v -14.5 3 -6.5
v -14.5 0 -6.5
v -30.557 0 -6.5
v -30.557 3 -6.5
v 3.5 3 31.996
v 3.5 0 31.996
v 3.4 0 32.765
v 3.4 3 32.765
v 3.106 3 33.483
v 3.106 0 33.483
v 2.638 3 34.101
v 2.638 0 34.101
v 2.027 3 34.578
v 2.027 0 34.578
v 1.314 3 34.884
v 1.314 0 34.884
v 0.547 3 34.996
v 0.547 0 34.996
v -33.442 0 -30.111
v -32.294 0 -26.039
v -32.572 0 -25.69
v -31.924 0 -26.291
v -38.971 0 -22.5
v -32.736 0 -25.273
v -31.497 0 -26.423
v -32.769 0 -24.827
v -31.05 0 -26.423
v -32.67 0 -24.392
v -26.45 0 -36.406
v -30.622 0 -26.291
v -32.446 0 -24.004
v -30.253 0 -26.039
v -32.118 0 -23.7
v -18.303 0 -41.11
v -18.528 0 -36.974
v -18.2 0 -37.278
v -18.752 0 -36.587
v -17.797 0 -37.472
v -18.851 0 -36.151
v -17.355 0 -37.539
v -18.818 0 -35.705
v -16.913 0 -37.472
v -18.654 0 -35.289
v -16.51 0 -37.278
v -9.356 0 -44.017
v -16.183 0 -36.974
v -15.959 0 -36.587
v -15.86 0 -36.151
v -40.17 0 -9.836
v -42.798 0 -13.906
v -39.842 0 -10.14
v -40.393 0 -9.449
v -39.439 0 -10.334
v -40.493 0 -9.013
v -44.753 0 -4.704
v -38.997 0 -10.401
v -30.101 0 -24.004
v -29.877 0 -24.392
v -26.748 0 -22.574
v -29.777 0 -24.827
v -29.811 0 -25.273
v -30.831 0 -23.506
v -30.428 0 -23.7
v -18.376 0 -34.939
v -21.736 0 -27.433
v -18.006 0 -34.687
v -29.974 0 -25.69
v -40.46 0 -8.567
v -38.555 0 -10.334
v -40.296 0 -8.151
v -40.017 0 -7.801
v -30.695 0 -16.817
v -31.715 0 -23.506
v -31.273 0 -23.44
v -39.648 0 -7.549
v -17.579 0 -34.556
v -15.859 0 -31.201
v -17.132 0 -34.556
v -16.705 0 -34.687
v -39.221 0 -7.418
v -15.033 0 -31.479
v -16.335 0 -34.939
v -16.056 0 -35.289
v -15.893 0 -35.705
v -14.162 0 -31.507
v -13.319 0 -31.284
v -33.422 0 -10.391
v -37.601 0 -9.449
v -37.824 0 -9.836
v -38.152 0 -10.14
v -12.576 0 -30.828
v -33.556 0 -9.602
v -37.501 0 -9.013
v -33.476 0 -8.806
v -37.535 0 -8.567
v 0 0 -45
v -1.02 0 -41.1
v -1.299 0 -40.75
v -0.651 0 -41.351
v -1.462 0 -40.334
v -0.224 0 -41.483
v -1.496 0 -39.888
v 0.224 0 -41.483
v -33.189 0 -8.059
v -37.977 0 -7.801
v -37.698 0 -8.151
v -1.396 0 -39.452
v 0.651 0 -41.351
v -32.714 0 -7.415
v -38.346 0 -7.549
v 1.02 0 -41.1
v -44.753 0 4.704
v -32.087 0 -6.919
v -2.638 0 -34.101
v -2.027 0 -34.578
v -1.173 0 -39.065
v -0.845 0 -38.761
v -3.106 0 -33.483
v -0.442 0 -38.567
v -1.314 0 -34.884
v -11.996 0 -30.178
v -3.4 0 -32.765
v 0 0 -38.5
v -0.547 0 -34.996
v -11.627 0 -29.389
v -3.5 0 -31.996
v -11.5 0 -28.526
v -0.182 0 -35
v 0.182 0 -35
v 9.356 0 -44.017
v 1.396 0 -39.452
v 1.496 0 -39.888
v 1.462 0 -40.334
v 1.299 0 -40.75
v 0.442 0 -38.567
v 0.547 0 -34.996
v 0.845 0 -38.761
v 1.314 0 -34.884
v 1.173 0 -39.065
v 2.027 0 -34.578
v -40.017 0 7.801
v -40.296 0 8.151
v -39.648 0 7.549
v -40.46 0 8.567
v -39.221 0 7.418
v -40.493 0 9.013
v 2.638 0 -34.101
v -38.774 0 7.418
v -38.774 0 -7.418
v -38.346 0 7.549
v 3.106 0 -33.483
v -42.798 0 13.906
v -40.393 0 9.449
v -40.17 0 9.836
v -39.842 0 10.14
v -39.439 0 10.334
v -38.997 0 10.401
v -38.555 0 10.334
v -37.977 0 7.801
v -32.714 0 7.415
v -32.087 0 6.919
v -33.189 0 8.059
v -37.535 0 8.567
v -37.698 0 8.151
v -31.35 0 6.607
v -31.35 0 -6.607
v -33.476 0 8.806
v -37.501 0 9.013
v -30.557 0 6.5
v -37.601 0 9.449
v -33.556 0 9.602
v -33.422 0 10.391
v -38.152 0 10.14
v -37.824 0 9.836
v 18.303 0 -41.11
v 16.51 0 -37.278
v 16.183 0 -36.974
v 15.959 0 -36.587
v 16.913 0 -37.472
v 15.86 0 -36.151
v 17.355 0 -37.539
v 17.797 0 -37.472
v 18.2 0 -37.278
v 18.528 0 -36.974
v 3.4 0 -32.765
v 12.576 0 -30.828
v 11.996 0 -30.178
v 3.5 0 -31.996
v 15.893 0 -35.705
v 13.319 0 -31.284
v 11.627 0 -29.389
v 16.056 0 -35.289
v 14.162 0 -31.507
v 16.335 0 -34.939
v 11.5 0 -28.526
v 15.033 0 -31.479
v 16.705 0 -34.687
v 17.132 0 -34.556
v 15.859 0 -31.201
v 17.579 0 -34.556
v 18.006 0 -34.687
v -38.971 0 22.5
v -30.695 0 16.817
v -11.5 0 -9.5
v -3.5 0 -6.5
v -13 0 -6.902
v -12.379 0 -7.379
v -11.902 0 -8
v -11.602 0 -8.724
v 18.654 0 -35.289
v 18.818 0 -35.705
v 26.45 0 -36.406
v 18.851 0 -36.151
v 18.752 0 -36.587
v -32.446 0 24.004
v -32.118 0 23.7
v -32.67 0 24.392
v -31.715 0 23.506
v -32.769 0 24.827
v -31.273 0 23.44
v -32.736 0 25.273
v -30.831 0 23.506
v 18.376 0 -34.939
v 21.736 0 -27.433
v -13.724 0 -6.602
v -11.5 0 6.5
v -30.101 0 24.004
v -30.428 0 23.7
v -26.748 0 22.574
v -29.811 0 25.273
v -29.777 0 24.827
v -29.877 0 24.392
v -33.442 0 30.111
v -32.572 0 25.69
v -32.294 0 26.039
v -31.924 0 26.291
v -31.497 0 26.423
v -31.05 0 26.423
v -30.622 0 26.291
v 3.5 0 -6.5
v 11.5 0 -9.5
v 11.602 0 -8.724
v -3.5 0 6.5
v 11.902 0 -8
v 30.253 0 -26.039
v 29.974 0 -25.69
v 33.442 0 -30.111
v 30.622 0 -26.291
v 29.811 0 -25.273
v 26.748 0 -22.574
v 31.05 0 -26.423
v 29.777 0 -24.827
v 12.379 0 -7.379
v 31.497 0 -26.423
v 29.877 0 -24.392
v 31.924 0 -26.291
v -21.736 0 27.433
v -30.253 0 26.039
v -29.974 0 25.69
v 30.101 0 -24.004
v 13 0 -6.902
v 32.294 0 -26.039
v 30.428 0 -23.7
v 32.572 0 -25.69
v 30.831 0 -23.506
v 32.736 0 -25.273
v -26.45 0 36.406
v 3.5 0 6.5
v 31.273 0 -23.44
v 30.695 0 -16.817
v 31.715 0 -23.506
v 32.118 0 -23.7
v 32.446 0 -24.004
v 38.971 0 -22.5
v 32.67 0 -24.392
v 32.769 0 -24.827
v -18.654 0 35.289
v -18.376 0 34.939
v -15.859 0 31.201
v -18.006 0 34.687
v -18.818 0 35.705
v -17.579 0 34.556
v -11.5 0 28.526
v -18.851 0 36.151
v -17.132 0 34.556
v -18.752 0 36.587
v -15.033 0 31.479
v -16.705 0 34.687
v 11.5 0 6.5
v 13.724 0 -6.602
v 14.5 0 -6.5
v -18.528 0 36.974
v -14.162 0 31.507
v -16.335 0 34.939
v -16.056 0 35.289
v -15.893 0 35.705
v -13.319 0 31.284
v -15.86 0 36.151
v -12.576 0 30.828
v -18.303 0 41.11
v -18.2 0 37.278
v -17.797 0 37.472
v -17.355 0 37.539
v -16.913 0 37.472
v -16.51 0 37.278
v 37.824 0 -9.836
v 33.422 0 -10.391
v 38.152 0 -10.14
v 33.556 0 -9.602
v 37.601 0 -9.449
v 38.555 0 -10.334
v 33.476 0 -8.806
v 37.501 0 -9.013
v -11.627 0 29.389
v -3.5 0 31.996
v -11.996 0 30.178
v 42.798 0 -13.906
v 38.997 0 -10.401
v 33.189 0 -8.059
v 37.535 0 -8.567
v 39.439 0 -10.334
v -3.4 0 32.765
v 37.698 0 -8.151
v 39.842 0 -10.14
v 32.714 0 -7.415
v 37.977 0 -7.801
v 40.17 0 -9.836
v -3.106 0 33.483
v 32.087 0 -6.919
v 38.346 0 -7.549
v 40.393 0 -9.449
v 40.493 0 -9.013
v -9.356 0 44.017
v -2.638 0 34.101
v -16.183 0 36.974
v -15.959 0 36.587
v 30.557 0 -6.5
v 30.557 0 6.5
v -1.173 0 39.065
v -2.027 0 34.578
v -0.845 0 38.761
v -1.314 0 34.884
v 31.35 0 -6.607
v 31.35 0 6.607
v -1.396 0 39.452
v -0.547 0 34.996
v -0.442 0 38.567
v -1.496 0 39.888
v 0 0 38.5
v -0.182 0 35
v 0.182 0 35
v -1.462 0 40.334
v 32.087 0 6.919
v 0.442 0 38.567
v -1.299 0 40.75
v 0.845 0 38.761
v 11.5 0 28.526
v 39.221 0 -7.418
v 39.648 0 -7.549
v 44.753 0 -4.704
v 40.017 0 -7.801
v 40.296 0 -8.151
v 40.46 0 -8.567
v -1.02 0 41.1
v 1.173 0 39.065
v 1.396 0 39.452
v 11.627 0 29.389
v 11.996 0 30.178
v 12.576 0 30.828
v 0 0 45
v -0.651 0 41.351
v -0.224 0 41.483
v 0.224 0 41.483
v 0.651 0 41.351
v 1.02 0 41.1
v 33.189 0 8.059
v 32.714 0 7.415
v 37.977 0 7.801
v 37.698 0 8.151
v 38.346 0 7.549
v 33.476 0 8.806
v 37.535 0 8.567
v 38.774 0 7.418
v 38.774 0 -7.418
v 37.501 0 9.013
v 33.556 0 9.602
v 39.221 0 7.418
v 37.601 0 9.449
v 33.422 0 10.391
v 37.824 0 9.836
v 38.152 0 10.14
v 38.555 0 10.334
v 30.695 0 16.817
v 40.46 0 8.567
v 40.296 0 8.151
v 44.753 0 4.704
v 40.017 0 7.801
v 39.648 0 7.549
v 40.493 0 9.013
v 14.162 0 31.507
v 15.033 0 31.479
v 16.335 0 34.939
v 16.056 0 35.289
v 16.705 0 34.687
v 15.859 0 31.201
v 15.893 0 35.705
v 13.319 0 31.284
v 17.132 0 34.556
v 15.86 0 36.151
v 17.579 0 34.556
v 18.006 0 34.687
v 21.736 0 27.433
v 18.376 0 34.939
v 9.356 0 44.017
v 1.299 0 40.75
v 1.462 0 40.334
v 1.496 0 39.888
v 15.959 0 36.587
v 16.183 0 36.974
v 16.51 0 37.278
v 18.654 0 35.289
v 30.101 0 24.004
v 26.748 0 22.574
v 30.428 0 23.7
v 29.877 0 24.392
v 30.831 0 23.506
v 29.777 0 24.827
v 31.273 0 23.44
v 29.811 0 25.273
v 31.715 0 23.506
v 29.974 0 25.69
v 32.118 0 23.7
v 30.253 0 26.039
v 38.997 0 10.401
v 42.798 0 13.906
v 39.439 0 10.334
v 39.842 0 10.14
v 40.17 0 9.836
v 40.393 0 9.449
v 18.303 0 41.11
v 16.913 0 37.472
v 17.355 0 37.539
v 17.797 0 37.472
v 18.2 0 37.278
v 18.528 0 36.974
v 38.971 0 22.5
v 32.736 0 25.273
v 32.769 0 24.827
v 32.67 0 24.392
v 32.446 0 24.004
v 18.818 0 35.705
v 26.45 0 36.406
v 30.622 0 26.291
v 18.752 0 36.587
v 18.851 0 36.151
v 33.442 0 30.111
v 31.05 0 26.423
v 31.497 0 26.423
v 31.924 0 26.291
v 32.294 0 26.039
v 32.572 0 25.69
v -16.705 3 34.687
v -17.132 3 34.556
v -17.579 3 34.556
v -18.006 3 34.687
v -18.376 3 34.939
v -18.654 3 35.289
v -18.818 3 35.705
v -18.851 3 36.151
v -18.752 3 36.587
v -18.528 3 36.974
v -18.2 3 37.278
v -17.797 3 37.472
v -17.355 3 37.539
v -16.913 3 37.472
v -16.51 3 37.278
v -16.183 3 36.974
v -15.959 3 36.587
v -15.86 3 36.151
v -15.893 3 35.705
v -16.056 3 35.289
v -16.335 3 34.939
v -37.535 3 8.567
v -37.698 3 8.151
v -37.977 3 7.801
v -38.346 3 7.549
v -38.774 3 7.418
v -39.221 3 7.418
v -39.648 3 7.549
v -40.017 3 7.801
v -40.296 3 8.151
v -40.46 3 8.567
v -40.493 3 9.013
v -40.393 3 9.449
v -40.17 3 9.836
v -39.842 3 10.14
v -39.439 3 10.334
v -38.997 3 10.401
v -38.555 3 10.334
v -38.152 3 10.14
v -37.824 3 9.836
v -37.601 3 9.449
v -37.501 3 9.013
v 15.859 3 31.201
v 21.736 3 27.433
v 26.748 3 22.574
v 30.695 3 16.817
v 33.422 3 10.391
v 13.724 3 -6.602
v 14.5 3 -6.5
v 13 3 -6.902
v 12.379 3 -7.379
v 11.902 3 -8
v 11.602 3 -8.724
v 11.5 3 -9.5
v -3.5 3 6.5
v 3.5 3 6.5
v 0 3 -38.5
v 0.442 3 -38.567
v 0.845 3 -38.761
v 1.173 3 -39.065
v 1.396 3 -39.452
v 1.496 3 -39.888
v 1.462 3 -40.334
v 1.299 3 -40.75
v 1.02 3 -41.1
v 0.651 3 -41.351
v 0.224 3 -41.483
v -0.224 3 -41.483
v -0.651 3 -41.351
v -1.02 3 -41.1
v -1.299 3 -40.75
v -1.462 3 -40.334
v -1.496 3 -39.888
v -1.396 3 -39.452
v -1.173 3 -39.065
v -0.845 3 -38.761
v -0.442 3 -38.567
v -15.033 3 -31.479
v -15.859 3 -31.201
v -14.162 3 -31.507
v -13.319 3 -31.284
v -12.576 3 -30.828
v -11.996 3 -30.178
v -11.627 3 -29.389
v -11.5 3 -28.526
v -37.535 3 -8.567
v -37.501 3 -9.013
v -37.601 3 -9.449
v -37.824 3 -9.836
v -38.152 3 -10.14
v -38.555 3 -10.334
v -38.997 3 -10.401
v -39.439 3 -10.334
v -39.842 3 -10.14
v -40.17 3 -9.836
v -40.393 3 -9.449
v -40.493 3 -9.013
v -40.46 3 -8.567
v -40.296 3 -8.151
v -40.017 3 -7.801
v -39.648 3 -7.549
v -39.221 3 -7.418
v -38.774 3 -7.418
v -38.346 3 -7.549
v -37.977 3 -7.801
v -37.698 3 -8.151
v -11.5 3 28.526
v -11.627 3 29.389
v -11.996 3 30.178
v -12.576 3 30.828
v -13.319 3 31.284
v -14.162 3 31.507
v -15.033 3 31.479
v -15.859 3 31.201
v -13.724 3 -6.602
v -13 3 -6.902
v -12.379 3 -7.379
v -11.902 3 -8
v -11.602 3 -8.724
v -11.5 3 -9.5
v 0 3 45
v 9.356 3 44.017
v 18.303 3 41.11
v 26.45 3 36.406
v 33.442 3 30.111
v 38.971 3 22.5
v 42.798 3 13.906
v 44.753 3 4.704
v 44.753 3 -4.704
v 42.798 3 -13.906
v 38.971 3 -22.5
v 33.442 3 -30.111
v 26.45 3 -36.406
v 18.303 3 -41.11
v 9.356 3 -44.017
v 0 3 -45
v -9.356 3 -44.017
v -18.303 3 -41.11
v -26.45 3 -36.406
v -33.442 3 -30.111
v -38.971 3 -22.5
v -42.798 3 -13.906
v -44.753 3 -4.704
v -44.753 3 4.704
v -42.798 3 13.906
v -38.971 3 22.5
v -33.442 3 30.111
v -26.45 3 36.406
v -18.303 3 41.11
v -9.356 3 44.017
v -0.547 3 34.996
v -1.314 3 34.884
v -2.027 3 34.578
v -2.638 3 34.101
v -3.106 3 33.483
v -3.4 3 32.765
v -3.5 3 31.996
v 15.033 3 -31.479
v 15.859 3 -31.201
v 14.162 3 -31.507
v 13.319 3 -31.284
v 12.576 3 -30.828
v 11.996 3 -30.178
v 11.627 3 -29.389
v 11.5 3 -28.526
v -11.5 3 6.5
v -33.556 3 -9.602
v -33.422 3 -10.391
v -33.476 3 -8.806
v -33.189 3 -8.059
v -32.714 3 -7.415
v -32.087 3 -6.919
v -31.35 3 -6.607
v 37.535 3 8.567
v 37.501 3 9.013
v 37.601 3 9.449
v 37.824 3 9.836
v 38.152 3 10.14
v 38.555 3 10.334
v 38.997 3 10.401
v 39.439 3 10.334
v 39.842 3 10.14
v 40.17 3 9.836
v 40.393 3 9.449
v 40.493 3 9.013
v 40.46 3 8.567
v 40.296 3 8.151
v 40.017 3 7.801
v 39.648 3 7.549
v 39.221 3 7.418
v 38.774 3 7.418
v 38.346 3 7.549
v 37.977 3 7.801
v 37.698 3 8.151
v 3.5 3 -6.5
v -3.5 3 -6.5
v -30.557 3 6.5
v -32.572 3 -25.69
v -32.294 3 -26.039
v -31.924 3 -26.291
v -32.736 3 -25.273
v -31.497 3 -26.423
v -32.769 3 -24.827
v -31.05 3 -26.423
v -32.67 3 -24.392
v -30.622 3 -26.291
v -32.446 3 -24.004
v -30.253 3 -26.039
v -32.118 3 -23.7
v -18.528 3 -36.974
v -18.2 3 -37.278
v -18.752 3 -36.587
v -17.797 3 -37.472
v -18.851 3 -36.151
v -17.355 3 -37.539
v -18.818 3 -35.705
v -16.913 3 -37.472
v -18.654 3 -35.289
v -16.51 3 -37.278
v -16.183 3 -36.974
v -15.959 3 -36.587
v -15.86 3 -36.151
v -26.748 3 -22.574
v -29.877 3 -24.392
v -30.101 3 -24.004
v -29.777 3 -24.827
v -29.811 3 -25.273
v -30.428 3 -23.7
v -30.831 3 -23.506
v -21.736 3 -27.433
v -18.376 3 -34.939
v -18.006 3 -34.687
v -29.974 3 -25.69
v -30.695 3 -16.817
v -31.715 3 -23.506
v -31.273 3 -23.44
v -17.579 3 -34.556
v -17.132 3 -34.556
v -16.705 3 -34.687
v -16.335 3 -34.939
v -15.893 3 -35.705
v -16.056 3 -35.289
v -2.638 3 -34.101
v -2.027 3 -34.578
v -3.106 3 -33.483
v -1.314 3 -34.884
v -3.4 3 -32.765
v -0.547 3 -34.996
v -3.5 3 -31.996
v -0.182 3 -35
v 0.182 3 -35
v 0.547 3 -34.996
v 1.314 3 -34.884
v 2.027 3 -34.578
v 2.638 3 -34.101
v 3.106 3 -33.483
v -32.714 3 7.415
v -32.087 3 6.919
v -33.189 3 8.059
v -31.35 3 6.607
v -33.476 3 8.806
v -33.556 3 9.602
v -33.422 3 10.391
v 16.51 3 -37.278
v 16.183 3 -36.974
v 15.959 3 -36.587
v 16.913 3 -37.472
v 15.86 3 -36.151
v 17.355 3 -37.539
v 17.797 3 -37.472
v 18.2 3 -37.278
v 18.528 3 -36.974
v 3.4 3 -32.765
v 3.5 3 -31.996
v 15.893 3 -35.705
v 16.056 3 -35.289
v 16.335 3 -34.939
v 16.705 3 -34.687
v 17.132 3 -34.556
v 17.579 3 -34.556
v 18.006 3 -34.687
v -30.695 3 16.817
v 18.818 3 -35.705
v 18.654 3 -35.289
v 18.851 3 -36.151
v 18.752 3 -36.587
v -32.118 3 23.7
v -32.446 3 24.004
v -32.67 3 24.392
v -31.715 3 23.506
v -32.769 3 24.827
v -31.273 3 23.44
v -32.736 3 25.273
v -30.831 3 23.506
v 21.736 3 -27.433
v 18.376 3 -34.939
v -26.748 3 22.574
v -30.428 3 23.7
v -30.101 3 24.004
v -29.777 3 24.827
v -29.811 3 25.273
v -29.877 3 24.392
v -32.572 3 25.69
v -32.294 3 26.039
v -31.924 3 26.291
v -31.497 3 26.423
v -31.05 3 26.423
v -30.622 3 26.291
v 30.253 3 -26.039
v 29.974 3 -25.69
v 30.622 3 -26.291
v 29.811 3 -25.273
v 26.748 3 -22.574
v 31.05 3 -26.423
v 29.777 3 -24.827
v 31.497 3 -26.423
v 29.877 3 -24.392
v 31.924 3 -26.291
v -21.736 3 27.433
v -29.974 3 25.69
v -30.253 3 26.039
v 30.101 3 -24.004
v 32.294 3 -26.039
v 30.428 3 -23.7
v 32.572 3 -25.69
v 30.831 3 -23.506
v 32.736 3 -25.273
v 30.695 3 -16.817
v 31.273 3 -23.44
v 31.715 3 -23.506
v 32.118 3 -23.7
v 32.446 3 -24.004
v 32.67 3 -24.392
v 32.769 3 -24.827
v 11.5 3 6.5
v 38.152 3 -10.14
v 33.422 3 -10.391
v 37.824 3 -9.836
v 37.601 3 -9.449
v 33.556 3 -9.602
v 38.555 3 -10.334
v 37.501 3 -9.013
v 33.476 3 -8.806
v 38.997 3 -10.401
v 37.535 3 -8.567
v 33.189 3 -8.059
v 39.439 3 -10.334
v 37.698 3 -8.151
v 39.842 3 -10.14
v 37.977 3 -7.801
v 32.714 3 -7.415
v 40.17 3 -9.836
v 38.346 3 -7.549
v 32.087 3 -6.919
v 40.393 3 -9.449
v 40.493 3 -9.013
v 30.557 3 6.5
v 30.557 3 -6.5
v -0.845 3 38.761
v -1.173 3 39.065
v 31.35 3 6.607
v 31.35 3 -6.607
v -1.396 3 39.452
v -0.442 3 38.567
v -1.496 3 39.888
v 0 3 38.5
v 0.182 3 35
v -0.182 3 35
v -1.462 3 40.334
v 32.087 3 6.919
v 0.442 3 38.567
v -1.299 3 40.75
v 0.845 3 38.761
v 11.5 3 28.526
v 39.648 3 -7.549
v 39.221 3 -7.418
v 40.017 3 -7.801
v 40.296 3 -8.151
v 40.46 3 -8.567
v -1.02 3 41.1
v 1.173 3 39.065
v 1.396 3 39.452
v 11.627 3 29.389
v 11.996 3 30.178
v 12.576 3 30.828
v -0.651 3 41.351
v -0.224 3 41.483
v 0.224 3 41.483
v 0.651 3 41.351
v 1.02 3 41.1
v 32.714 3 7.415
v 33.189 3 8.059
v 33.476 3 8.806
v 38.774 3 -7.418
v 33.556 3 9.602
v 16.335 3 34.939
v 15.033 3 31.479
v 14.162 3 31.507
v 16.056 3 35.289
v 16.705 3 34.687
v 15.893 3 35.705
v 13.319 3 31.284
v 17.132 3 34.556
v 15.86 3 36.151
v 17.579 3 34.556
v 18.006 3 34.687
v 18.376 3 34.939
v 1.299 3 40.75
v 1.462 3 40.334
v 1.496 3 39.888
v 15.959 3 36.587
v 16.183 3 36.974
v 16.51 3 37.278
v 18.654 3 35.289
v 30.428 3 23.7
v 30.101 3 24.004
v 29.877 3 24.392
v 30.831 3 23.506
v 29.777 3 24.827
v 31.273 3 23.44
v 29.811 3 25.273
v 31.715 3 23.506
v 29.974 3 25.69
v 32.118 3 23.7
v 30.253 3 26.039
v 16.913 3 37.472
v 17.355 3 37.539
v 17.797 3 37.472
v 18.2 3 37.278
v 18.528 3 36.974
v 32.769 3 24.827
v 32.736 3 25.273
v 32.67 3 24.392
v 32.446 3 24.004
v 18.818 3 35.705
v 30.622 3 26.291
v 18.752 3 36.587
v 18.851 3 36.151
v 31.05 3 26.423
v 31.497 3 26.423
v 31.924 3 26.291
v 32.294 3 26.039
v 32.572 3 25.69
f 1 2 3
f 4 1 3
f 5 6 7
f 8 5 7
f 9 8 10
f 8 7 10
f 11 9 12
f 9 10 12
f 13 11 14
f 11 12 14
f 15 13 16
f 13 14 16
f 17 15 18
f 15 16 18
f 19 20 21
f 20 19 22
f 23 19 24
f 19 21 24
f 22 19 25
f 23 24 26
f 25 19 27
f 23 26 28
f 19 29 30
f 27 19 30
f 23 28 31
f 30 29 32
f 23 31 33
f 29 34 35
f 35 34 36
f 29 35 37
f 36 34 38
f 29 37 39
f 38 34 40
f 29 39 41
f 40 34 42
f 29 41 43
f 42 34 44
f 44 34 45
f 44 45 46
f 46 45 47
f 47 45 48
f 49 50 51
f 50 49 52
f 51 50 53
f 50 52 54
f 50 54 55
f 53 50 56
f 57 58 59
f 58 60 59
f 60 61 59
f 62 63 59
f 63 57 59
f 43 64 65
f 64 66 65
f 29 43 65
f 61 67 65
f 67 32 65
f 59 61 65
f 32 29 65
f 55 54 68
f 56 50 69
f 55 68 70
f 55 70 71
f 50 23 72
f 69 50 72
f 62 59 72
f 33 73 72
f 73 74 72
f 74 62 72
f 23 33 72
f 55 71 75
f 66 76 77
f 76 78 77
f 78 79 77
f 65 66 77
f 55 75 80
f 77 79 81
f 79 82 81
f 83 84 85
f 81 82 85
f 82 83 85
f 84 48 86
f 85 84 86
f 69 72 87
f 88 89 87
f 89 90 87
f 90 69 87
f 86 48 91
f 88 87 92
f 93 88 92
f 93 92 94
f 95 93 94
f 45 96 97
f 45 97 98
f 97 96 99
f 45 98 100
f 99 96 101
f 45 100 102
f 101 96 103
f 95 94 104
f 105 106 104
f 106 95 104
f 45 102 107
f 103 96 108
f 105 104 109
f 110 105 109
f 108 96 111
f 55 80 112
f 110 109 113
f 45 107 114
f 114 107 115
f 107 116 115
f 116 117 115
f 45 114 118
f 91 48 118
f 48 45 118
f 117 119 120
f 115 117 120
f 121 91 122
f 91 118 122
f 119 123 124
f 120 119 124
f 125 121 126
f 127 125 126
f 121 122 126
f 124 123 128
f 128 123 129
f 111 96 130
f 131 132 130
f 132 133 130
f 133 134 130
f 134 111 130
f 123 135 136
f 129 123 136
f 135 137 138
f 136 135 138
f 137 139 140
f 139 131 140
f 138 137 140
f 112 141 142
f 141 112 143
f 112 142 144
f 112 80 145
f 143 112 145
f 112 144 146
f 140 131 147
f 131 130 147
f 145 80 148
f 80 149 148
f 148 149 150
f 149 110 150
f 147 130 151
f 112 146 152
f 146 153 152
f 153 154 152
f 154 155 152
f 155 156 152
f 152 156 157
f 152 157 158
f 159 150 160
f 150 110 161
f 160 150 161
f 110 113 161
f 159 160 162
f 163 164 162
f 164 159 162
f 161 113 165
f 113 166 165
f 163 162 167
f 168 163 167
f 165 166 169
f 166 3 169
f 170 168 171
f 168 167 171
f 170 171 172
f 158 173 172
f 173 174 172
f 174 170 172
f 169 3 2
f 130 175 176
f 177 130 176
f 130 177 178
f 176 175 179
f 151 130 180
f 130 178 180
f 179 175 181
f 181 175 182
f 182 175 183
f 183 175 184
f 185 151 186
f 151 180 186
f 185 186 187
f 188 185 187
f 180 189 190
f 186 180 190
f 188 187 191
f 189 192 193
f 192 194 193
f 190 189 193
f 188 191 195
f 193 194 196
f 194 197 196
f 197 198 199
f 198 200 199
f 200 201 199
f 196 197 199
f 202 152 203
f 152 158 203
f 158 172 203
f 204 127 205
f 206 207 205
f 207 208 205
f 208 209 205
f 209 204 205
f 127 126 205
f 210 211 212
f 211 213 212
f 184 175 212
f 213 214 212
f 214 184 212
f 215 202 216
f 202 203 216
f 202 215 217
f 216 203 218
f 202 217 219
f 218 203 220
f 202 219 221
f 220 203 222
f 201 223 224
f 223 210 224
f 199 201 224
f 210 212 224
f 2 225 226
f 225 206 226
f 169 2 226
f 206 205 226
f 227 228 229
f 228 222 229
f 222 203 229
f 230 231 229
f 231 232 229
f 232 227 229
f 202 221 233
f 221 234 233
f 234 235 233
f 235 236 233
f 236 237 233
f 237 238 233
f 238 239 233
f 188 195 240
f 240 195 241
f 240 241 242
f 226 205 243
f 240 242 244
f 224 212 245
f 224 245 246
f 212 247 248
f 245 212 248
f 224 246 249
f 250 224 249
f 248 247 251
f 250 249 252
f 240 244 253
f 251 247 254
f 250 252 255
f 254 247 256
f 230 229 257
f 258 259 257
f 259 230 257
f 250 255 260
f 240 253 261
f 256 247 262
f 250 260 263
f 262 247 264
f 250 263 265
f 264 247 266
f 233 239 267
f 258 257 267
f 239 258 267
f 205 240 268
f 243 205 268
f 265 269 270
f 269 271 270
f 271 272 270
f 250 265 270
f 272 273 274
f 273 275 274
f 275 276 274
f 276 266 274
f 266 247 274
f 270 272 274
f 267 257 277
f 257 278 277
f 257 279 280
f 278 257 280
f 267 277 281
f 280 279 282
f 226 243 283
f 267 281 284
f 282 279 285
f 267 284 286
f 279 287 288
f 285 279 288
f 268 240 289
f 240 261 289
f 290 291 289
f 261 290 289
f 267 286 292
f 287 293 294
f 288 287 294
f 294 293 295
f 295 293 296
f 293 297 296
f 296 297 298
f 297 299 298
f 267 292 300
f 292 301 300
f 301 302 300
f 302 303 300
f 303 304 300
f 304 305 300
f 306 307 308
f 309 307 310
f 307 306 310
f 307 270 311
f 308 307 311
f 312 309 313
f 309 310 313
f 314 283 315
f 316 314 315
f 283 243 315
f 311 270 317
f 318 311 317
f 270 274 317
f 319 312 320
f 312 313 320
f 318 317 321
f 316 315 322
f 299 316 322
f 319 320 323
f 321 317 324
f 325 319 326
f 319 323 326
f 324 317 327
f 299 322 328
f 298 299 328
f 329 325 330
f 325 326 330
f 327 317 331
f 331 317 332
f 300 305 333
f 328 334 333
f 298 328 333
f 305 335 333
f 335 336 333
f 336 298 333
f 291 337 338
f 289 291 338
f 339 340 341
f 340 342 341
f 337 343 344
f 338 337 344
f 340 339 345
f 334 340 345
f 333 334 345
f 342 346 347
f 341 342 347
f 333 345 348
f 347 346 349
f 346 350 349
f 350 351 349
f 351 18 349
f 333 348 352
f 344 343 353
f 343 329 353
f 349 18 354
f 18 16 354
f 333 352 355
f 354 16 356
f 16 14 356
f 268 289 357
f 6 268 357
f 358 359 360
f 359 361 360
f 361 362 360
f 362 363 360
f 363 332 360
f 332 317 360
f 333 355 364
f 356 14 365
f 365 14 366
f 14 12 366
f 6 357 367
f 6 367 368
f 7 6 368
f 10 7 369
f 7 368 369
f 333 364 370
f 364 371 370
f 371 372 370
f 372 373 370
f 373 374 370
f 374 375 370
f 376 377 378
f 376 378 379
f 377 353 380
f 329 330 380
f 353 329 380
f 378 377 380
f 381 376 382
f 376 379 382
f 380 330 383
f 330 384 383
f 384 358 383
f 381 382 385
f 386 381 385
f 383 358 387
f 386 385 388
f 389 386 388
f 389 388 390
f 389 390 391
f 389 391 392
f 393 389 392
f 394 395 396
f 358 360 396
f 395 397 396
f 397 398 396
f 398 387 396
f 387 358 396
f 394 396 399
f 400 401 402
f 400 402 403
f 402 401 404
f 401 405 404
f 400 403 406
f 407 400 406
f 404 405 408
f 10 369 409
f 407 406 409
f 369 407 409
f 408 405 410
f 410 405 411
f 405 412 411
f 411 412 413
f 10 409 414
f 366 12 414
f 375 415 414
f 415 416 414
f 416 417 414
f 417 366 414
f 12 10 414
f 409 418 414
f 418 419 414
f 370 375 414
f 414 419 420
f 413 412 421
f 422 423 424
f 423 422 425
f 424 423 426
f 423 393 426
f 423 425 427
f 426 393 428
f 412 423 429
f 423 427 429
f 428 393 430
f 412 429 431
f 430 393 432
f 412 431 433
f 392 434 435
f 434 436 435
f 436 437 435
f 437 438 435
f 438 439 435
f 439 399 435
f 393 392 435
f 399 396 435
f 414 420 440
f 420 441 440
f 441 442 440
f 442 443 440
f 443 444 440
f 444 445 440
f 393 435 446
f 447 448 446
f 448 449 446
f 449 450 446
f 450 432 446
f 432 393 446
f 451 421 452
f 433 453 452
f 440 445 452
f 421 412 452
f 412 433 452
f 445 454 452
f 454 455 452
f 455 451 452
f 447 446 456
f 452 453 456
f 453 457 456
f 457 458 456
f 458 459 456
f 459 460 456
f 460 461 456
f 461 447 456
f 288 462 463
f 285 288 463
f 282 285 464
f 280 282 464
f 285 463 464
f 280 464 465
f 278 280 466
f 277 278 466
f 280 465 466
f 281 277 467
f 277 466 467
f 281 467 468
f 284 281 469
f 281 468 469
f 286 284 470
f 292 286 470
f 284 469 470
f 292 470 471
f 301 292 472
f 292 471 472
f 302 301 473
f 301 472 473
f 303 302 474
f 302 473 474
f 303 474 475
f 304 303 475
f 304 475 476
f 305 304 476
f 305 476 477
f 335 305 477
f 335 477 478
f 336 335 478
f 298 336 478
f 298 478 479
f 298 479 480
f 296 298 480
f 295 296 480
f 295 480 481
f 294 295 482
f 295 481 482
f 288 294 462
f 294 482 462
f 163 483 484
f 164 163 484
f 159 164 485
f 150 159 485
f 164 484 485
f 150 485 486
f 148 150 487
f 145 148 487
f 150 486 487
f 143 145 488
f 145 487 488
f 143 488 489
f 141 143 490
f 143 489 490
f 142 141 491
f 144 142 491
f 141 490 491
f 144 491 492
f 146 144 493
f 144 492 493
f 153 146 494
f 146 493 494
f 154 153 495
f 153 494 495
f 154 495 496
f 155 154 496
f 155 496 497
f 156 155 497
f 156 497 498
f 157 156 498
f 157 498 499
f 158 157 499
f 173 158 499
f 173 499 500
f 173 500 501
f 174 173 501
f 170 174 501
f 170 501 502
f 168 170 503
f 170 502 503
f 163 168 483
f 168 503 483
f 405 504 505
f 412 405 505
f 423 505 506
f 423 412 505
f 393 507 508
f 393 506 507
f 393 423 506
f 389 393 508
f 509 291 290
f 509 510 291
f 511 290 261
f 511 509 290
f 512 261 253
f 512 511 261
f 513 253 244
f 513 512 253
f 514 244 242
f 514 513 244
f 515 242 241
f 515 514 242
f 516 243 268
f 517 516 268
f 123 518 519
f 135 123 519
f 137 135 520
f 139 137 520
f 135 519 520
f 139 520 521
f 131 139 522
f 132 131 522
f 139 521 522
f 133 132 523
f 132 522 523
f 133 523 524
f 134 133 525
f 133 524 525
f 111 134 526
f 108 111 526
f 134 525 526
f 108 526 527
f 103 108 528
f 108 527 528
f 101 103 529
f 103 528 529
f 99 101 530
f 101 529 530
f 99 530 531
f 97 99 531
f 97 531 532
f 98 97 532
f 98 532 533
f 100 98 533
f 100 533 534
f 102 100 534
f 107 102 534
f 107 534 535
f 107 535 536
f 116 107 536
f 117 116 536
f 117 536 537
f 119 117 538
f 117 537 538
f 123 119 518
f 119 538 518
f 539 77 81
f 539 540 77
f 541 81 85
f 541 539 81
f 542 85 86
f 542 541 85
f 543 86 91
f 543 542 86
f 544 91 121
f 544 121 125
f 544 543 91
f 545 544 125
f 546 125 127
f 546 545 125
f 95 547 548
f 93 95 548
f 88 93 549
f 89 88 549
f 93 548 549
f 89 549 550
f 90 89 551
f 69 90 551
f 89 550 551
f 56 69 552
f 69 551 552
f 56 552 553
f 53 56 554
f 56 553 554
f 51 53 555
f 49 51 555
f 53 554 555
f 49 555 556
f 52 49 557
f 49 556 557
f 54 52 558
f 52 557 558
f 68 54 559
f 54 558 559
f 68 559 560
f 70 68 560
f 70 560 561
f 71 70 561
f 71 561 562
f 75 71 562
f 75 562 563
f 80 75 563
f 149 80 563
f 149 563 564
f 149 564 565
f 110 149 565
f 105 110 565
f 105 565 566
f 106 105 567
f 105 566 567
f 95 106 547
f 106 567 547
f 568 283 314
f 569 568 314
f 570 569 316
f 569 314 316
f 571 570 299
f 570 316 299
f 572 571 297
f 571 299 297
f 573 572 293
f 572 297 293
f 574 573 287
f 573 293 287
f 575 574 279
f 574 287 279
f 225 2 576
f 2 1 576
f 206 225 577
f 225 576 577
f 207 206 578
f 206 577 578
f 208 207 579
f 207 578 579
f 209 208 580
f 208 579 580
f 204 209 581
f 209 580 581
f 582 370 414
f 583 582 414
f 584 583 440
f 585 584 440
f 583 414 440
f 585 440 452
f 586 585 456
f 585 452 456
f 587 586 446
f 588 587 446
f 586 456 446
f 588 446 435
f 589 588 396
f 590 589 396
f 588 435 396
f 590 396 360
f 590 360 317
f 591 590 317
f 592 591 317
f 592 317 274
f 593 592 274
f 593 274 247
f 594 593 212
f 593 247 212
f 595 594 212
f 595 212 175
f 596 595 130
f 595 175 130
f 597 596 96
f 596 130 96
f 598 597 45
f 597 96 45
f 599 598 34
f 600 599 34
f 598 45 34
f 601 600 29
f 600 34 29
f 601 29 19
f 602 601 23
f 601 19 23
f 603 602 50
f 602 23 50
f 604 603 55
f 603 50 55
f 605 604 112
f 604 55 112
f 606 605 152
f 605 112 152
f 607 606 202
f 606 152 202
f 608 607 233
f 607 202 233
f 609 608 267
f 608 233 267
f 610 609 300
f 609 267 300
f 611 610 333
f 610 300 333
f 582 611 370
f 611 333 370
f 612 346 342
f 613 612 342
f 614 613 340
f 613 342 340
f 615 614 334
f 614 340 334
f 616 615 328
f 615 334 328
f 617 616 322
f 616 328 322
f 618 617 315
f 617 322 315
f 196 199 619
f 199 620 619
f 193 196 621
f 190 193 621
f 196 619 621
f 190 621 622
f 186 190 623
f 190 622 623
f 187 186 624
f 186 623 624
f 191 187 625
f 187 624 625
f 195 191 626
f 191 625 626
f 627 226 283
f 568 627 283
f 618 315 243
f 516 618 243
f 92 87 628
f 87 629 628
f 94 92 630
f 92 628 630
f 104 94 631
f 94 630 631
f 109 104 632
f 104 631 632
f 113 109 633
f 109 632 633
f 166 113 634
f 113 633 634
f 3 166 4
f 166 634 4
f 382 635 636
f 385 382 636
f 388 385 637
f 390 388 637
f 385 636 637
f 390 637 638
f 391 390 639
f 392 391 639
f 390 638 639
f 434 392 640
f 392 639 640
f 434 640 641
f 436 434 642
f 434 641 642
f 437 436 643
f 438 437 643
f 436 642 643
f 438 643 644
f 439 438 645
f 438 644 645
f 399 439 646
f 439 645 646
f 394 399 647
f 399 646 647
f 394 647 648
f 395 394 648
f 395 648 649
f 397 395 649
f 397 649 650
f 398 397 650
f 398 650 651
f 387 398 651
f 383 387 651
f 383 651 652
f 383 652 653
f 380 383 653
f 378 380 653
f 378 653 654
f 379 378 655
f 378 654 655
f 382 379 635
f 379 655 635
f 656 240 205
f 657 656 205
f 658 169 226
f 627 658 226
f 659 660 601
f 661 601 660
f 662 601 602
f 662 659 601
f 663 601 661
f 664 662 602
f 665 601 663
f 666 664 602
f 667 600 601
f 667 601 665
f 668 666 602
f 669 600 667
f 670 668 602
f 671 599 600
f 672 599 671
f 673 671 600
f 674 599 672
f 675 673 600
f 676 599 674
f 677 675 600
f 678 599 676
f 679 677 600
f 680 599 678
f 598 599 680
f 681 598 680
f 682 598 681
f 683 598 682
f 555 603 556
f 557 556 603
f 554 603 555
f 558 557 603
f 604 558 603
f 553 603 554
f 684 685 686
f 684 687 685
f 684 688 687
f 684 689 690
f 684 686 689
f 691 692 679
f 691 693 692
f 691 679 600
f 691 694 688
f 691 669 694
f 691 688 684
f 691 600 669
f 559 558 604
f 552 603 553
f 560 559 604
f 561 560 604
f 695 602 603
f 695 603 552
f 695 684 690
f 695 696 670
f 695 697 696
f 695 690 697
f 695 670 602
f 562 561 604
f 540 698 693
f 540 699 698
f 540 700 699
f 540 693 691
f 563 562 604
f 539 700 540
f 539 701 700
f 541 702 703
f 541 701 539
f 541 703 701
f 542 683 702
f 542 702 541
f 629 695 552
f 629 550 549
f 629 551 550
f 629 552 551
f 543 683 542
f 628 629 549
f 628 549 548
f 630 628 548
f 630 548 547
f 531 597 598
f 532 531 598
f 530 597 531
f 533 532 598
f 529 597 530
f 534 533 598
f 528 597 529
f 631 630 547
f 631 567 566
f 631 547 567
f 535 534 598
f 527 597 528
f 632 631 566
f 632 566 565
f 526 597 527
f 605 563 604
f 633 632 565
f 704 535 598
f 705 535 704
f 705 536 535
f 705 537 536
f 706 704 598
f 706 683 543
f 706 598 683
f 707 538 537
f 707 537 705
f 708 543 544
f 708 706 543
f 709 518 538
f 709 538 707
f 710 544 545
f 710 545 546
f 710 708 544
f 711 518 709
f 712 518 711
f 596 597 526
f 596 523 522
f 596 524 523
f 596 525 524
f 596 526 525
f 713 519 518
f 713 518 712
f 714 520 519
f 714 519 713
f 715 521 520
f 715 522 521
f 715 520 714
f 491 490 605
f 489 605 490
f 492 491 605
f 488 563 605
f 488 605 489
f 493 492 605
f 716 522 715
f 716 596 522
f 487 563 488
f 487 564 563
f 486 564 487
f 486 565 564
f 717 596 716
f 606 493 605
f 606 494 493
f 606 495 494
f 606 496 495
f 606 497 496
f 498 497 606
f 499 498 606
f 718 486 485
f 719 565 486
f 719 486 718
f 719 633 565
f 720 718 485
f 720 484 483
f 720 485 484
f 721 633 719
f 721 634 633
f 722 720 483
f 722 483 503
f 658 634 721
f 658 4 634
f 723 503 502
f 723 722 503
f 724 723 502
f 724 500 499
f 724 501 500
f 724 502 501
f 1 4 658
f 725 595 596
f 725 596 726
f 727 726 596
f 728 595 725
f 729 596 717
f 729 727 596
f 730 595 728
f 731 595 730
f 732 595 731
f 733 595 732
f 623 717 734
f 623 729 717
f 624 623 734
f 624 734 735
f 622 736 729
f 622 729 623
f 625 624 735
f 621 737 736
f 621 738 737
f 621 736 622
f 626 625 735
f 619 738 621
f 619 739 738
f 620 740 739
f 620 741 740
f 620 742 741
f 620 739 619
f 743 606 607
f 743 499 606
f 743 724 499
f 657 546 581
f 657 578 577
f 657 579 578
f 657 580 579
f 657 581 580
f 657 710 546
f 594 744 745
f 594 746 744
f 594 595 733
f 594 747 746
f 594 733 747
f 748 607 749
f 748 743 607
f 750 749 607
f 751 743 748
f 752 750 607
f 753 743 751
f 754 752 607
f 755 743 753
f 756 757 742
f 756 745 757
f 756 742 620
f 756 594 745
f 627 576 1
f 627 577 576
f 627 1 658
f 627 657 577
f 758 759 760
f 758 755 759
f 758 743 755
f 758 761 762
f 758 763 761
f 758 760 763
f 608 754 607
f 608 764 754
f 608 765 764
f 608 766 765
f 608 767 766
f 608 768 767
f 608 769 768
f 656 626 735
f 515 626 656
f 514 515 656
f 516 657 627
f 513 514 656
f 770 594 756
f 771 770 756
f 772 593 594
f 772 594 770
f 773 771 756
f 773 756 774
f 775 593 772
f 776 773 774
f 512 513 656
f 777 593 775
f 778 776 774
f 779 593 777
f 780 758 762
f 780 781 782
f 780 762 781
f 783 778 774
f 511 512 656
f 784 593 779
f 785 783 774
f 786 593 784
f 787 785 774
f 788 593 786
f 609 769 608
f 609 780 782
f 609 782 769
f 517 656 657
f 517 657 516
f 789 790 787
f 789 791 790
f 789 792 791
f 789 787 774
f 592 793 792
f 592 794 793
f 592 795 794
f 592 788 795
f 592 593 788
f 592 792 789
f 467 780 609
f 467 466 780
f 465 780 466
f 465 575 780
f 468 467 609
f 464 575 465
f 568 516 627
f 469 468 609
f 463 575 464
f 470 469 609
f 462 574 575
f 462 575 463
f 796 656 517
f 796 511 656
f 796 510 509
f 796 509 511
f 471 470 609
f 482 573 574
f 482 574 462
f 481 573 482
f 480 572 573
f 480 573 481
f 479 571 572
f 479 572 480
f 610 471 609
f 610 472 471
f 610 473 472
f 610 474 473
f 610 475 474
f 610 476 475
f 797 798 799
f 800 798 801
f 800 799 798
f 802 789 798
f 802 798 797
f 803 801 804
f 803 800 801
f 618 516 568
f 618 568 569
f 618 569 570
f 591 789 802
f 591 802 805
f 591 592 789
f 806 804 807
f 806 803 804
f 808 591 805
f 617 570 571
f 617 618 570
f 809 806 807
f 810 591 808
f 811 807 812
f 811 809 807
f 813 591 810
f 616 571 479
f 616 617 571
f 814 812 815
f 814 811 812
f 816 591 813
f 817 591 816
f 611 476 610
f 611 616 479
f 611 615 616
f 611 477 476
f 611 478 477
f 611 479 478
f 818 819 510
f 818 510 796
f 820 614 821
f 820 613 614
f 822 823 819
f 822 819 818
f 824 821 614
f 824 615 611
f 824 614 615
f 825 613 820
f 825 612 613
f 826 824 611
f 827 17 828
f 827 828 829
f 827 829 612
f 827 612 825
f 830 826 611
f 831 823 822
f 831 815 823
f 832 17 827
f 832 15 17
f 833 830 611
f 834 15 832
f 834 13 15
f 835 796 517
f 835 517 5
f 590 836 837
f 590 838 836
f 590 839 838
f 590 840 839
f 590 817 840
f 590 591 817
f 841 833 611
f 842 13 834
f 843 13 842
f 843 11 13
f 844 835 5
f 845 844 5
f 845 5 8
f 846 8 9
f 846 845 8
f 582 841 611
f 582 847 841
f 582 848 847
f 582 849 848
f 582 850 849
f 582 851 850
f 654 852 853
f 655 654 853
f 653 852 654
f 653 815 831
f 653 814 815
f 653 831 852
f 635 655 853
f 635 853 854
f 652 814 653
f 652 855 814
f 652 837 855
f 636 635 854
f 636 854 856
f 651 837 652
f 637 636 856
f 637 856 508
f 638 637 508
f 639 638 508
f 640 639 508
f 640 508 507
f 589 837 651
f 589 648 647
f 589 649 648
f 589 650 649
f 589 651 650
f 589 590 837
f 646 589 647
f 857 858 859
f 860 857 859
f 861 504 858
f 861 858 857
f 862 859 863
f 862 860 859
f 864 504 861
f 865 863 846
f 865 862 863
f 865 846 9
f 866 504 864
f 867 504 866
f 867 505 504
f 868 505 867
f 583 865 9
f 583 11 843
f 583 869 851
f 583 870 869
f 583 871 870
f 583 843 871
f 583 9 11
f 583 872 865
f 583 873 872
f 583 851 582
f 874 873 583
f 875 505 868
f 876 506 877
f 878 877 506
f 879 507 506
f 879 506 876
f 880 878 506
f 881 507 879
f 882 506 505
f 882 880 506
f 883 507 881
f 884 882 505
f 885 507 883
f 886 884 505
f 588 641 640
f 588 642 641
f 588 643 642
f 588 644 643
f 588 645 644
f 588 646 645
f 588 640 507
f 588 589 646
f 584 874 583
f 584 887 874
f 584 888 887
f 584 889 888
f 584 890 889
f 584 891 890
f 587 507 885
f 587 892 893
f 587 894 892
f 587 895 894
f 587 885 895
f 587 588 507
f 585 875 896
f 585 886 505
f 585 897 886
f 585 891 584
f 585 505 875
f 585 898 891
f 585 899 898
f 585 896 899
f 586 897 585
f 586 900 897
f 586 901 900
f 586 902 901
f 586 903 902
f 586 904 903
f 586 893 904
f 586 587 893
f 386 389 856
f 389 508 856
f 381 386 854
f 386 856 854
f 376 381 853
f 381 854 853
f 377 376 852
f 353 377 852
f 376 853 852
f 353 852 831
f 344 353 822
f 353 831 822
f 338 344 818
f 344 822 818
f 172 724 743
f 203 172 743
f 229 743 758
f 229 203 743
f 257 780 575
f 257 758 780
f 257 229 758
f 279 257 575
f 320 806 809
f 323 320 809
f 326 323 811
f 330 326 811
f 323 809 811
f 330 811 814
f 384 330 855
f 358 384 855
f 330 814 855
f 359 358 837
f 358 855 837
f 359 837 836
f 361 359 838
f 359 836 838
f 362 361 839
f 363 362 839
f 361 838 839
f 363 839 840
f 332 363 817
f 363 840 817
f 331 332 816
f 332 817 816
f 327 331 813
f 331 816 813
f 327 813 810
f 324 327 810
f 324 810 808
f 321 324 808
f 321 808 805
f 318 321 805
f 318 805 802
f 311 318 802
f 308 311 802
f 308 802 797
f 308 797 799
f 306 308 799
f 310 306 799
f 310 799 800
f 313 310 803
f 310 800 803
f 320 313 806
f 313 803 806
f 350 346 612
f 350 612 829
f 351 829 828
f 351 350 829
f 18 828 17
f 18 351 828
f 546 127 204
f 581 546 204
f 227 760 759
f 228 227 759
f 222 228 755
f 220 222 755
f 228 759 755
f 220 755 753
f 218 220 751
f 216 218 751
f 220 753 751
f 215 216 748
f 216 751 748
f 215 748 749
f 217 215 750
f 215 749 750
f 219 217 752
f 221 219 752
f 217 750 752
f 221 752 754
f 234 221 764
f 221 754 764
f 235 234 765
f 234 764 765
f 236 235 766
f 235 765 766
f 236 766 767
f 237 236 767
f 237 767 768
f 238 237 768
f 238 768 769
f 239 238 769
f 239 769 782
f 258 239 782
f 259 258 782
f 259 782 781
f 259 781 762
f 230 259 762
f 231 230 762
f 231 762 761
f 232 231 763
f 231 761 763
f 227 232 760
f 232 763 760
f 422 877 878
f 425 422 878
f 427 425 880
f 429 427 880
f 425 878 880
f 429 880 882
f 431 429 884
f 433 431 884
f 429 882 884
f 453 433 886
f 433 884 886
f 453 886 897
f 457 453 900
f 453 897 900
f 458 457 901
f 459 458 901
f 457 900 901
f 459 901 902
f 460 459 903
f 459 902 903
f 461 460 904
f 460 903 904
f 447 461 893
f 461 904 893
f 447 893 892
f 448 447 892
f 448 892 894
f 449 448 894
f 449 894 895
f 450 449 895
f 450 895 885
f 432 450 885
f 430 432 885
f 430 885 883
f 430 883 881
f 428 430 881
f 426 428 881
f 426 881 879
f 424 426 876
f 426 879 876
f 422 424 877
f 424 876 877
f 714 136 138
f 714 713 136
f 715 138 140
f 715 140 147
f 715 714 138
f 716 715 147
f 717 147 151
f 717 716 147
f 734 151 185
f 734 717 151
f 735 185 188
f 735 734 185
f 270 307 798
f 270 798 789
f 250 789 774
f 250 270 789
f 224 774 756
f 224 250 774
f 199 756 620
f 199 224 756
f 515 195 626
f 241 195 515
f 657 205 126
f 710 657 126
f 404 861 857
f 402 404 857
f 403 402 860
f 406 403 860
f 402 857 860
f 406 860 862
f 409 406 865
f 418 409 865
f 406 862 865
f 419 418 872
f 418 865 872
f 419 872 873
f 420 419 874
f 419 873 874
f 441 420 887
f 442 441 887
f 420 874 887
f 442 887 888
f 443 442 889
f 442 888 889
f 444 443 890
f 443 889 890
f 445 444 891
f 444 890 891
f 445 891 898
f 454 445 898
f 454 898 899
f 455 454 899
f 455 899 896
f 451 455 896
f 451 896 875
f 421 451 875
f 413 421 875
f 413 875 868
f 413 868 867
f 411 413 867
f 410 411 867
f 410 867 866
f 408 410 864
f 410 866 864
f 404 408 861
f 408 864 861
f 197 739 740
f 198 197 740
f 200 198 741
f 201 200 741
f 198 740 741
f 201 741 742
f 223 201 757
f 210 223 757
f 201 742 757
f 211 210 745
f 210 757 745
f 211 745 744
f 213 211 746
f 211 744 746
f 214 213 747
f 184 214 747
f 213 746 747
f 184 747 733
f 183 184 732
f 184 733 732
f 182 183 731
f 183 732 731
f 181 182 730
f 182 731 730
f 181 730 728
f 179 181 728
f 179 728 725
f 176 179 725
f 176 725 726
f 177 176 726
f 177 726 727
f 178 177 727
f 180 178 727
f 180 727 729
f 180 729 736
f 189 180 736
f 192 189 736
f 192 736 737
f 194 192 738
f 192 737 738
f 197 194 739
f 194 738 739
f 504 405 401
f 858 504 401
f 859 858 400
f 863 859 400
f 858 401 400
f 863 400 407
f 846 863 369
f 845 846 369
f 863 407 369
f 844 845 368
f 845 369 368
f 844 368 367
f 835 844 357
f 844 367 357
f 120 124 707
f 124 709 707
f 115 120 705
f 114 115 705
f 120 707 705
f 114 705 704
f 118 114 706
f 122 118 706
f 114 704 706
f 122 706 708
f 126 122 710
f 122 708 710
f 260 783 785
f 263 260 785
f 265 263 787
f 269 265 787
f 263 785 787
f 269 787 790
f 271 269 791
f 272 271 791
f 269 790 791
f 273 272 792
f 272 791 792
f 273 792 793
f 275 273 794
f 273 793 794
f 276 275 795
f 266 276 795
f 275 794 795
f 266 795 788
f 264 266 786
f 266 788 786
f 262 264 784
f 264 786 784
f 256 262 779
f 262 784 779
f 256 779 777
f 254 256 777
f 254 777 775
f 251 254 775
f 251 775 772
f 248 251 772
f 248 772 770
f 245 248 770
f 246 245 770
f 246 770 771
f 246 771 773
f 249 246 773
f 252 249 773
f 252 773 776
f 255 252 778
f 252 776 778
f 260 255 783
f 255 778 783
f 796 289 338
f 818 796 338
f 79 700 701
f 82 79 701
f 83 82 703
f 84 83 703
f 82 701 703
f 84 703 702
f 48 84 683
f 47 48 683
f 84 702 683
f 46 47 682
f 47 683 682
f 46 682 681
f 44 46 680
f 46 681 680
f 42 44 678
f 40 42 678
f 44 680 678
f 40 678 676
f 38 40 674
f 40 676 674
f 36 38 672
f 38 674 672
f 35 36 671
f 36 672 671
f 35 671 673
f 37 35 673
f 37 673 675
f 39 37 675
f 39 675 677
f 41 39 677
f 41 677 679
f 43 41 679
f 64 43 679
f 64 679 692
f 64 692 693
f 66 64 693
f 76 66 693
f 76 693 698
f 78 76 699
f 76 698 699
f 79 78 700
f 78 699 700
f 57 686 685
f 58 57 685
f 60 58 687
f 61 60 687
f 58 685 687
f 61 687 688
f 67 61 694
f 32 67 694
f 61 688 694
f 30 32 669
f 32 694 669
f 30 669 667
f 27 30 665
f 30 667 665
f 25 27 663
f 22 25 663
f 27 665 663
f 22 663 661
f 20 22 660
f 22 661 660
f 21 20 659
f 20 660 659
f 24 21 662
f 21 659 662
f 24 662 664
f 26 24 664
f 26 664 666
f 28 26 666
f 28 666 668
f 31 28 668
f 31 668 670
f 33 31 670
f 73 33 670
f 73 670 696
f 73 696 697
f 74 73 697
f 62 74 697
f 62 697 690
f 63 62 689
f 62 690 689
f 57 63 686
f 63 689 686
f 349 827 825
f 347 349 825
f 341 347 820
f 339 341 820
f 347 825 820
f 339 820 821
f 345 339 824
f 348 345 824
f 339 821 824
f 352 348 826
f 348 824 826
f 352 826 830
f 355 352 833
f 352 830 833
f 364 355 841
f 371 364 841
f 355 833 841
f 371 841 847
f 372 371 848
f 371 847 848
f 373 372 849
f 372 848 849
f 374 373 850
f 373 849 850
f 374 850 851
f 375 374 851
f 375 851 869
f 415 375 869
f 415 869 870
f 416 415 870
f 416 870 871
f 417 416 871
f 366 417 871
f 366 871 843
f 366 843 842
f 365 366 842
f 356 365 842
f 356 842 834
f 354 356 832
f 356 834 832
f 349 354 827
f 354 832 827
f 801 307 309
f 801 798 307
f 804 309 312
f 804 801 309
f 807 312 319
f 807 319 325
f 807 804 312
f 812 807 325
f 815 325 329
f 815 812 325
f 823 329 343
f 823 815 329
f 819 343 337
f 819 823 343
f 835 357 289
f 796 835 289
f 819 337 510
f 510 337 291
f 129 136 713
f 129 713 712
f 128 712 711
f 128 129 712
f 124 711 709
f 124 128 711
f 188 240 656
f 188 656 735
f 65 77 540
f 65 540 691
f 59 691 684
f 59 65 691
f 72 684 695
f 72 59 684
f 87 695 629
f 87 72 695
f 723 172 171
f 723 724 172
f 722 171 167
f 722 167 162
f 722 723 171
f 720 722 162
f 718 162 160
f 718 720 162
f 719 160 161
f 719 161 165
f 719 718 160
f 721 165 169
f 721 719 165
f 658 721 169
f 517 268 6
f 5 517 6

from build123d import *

# Parameters (mm, degrees)
SKETCH_1_R               = 45
SKETCH_1_R_2             = 35
EXTRUDE_1_DEPTH          = 3
EXTRUDE_2_DEPTH          = 3
SKETCH_3_R               = 1.5
CUT_EXTRUDE_1_DEPTH      = 3
PATTERN_CIRCULAR_1_COUNT = 14
FILLET_1_R               = 3
EXTRUDE_3_DEPTH          = 3
FILLET_2_R               = 3
MIRROR_1_DEPTH           = 3


# Read off the part's stored shape, not the designer's step: Зеркальное отражение1
with BuildPart() as part:
    # Эскиз1 → Бобышка-Вытянуть1 (new body)
    with BuildSketch(Plane(origin=(0, 0, 0), x_dir=(1, 0, 0), z_dir=(0, 1, 0))):
        with Locations(Location((0, 0, 0), (0, 0, 270))):
            Circle(SKETCH_1_R)
        with Locations(Location((0, 0, 0), (0, 0, 270))):
            Circle(SKETCH_1_R_2, mode=Mode.SUBTRACT)
    extrude(amount=EXTRUDE_1_DEPTH)

    # Эскиз2 → Бобышка-Вытянуть2 (add)
    with BuildSketch(Plane(origin=(0, 0, 0), x_dir=(1, 0, 0), z_dir=(0, 1, 0))):
        with BuildLine():
            ThreePointArc((-34.391132578, 6.5), (-34.847450698, 3.264227303), (-35, 0))
            Line((-35, 0), (35, 0))
            ThreePointArc((35, 0), (34.847450698, 3.264227303), (34.391132578, 6.5))
            Line((34.391132578, 6.5), (-34.391132578, 6.5))
        make_face()
        with BuildLine():
            Line((35, 0), (-35, 0))
            ThreePointArc((-35, 0), (-34.847450698, -3.264227303), (-34.391132578, -6.5))
            Line((-34.391132578, -6.5), (34.391132578, -6.5))
            ThreePointArc((34.391132578, -6.5), (34.847450698, -3.264227303), (35, 0))
        make_face()
    extrude(amount=EXTRUDE_2_DEPTH)

    # Эскиз3 → Вырез-Вытянуть1 (cut)
    with BuildSketch(Plane(origin=(0, 3, 0), x_dir=(1, 0, 0), z_dir=(0, 1, 0))):
        with Locations(Location((0, 40, 0), (0, 0, 270))):
            Circle(SKETCH_3_R)
    cut_extrude_1 = extrude(amount=-CUT_EXTRUDE_1_DEPTH, mode=Mode.SUBTRACT)

    # Круговой массив1: Вырез-Вытянуть1 ×14 about axis
    pattern_circular_1_axis = Axis((0, 0, 0), (0, 1, 0))
    for i in range(1, PATTERN_CIRCULAR_1_COUNT):
        add(cut_extrude_1.rotate(pattern_circular_1_axis, i * 360 / PATTERN_CIRCULAR_1_COUNT), mode=Mode.SUBTRACT)

    # Скругление1
    fillet_1_edges = [part.edges().sort_by_distance(p)[0] for p in [
        (-34.391132578, 1.5, -6.5),
        (-34.391132578, 1.5, 6.5),
        (34.391132578, 1.5, 6.5),
        (34.391132578, 1.5, -6.5),
    ]]
    fillet(fillet_1_edges, radius=FILLET_1_R)

    # Эскиз4 → Бобышка-Вытянуть3 (add)
    with BuildSketch(Plane(origin=(0, 0, 0), x_dir=(1, 0, 0), z_dir=(0, 1, 0))):
        with BuildLine():
            Line((-3.5, 6.5), (-3.5, 34.824560299))
            ThreePointArc((-3.5, 34.824560299), (-7.551905138, 34.175557476), (-11.5, 33.056769352))
            Line((-11.5, 33.056769352), (-11.5, 6.5))
            Line((-11.5, 6.5), (-3.5, 6.5))
        make_face()
        with BuildLine():
            Line((3.5, 6.5), (3.5, 34.824560299))
            ThreePointArc((3.5, 34.824560299), (7.551905138, 34.175557476), (11.5, 33.056769352))
            Line((11.5, 33.056769352), (11.5, 6.5))
            Line((11.5, 6.5), (3.5, 6.5))
        make_face()
    extrude(amount=EXTRUDE_3_DEPTH)

    # Скругление2
    fillet_2_edges = [part.edges().sort_by_distance(p)[0] for p in [
        (-11.5, 1.5, -6.5),
        (-3.5, 1.5, -34.824560299),
        (-11.5, 1.5, -33.056769352),
        (11.5, 1.5, -6.5),
        (11.5, 1.5, -33.056769352),
        (3.5, 1.5, -34.824560299),
    ]]
    fillet(fillet_2_edges, radius=FILLET_2_R)

    # Зеркальное отражение1 outline → Зеркальное отражение1 (add)
    with BuildSketch(Plane(origin=(0, 0, 0), x_dir=(1, 0, 0), z_dir=(0, 1, 0))):
        with BuildLine():
            ThreePointArc((-0.546875, -34.995727278), (-2.637828922, -34.100775792), (-3.5, -31.996093512))
            Line((-3.5, -31.996093512), (-3.5, -6.5))
            Line((-3.5, -6.5), (-11.5, -6.5))
            Line((-11.5, -6.5), (-11.5, -28.526303651))
            ThreePointArc((-11.5, -28.526303651), (-12.93126245, -31.083462719), (-15.859375, -31.200644618))
            ThreePointArc((-15.859375, -31.200644618), (-8.419734133, -33.972166212), (-0.546875, -34.995727278))
        make_face()
        with BuildLine():
            Line((11.5, -6.5), (3.5, -6.5))
            Line((3.5, -6.5), (3.5, -31.996093512))
            ThreePointArc((3.5, -31.996093512), (2.637828922, -34.100775792), (0.546875, -34.995727278))
            ThreePointArc((0.546875, -34.995727278), (8.419734133, -33.972166212), (15.859375, -31.200644618))
            ThreePointArc((15.859375, -31.200644618), (12.93126245, -31.083462719), (11.5, -28.526303651))
            Line((11.5, -28.526303651), (11.5, -6.5))
        make_face()
    extrude(amount=MIRROR_1_DEPTH)


solid = part.part
